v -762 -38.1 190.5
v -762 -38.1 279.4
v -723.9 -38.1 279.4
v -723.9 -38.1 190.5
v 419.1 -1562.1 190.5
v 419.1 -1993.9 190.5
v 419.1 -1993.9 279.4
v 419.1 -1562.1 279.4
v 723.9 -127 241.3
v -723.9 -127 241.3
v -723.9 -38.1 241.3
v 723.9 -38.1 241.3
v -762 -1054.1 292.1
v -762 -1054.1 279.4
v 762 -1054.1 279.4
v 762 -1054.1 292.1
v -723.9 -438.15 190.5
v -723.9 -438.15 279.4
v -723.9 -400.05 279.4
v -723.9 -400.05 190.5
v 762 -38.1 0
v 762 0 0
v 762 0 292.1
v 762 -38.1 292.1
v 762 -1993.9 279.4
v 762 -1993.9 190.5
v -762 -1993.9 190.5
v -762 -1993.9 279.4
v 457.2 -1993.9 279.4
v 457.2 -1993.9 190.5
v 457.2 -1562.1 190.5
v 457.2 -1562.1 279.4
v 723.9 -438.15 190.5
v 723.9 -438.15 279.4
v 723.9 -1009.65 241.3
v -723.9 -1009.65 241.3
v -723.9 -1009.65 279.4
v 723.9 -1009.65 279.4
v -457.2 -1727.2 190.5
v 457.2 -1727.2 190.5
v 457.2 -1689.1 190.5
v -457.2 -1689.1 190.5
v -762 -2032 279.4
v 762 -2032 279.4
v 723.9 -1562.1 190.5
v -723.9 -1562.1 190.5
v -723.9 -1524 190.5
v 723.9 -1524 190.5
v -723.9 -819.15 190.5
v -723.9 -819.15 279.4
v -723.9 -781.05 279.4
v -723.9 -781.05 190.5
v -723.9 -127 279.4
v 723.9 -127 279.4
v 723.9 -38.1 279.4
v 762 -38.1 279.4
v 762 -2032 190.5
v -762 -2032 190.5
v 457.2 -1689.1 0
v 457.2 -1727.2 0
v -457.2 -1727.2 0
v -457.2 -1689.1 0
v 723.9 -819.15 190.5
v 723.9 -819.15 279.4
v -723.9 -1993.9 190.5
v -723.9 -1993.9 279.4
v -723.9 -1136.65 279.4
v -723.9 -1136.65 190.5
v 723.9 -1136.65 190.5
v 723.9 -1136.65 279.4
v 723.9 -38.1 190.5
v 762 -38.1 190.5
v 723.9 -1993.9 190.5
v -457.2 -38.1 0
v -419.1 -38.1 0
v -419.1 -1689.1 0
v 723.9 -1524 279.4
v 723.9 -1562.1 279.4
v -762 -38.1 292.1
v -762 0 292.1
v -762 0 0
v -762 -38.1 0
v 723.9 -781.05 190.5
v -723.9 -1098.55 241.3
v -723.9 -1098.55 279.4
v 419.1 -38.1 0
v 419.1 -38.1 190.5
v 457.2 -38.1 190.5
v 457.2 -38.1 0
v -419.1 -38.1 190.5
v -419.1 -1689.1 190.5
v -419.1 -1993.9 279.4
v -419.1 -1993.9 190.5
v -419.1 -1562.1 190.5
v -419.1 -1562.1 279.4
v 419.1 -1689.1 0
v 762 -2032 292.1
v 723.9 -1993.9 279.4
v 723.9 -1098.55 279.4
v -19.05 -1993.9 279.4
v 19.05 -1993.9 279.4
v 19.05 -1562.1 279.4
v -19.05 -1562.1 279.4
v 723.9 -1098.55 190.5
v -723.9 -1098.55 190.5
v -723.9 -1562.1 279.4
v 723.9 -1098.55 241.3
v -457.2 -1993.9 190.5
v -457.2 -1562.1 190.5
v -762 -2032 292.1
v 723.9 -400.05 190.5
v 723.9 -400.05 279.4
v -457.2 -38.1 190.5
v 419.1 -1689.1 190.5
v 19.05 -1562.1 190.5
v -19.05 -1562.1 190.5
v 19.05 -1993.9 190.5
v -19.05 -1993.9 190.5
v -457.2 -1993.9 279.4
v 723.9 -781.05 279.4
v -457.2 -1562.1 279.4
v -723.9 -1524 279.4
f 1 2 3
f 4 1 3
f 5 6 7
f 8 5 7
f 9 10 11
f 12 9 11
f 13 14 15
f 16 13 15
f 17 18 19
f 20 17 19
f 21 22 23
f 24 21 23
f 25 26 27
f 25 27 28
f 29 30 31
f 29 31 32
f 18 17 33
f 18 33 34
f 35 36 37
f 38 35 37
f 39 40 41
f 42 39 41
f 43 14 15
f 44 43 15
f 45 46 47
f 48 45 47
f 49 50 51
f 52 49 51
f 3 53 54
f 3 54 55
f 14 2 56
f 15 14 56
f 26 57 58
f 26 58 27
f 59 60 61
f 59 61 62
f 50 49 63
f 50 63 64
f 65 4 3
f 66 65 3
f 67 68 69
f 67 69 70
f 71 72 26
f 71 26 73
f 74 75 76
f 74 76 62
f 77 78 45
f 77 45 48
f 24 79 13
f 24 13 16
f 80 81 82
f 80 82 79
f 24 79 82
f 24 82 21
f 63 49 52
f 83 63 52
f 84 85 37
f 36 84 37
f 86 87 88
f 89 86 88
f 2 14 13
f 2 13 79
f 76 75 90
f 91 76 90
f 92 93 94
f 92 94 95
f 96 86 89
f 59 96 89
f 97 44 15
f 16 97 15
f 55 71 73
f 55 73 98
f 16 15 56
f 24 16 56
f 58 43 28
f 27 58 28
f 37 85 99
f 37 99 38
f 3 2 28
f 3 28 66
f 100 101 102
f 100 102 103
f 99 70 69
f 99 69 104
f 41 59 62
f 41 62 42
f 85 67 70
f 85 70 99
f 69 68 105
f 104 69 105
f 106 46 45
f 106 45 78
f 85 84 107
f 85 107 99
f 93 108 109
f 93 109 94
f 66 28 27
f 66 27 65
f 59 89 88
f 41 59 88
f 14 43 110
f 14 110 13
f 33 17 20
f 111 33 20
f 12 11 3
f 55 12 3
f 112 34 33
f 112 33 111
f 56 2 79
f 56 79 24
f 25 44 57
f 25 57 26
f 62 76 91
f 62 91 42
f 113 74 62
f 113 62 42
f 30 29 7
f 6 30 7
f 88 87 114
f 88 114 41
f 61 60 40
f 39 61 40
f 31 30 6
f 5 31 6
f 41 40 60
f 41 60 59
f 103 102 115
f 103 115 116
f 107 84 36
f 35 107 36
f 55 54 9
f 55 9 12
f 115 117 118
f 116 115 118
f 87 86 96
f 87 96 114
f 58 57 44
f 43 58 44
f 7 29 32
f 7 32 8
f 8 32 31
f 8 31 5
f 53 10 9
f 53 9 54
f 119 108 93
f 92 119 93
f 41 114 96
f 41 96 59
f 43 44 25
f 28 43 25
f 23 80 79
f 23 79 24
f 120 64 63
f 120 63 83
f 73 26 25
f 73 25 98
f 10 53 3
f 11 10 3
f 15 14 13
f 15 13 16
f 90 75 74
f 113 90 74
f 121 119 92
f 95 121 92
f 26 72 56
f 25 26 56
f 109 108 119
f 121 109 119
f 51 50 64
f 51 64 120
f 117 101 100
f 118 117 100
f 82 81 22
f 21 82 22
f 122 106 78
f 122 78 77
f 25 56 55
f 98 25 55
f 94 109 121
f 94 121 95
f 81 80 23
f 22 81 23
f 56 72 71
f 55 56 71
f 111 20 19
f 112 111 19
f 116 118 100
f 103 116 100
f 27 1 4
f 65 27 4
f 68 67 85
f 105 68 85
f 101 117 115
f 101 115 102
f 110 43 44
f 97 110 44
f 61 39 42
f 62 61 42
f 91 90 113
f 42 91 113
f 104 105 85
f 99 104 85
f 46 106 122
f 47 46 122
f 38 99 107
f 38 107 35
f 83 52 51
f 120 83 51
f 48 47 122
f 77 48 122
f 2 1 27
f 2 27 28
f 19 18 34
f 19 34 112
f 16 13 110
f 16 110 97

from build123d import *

# Parameters (mm, degrees)
F0_W      = 1524
F0_H      = 292.1
F1_DEPTH  = 38.1
F2_W      = 38.1
F2_H      = 190.5
F3_DEPTH  = 1651
F5_W      = 38.1
F5_H      = 190.5
F6_DEPTH  = 914.4
F7_W      = 38.1
F7_H      = 88.9
F8_DEPTH  = 1955.8
F10_W     = 38.1
F10_H     = 88.9
F11_DEPTH = 1524
F12_W     = 38.1
F12_H     = 88.9
F13_DEPTH = 431.8
F15_W     = 38.1
F15_H     = 88.9
F16_DEPTH = 431.8
F17_W     = 38.1
F17_H     = 88.9
F18_DEPTH = 1447.8
F19_W     = 88.9
F19_H     = 38.1
F20_DEPTH = 1447.8
F21_W     = 38.1
F21_H     = 88.9
F22_DEPTH = 1447.8
F23_W     = 88.9
F23_H     = 38.1
F24_DEPTH = 1447.8
F25_W     = 38.1
F25_H     = 88.9
F26_DEPTH = 1447.8
F27_W     = 38.1
F27_H     = 88.9
F28_DEPTH = 1447.8
F29_W     = 1524
F29_H     = 977.9
F30_DEPTH = 12.7
F31_W     = 1524
F31_H     = 1016
F32_DEPTH = 12.7


with BuildPart() as f1:
    # F0 (on Front) → F1 (new body)
    with BuildSketch(Plane.XZ):
        with Locations((0, 146.05)):
            Rectangle(F0_W, F0_H)
    extrude(amount=F1_DEPTH)


with BuildPart() as f3:
    # F2 (on face) → F3 (new body)
    with BuildSketch(Plane.XZ.offset(38.1)):
        with Locations((438.15, 95.25)):
            Rectangle(F2_W, F2_H)
    extrude(amount=F3_DEPTH)


with BuildPart() as f4_1:
    # F4: instance of F3
    add(f3.part.mirror(Plane.YZ))


with BuildPart() as f6:
    # F5 (on face) → F6 (new body)
    with BuildSketch(Plane.YZ.offset(457.2)):
        with Locations((-1708.15, 95.25)):
            Rectangle(F5_W, F5_H)
    extrude(amount=-F6_DEPTH)


with BuildPart() as f8:
    # F7 (on face) → F8 (new body)
    with BuildSketch(Plane.XZ.offset(38.1)):
        with Locations((-742.95, 234.95)):
            Rectangle(F7_W, F7_H)
    extrude(amount=F8_DEPTH)


with BuildPart() as f9_1:
    # F9: instance of F8
    add(f8.part.mirror(Plane.YZ))


with BuildPart() as f11:
    # F10 (on face) → F11 (new body)
    with BuildSketch(Plane.YZ.offset(762)):
        with Locations((-2012.95, 234.95)):
            Rectangle(F10_W, F10_H)
    extrude(amount=-F11_DEPTH)


with BuildPart() as f13:
    # F12 (on face) → F13 (new body)
    with BuildSketch(Plane(origin=(0, -1993.9, 0), x_dir=(-1, 0, 0), z_dir=(0, 1, 0))):
        with Locations((-438.15, 234.95)):
            Rectangle(F12_W, F12_H)
    extrude(amount=F13_DEPTH)


with BuildPart() as f14_1:
    # F14: instance of F13
    add(f13.part.mirror(Plane.YZ))


with BuildPart() as f16:
    # F15 (on face) → F16 (new body)
    with BuildSketch(Plane(origin=(0, -1993.9, 0), x_dir=(-1, 0, 0), z_dir=(0, 1, 0))):
        with Locations((0, 234.95)):
            Rectangle(F15_W, F15_H)
    extrude(amount=F16_DEPTH)


with BuildPart() as f18:
    # F17 (on face) → F18 (new body)
    with BuildSketch(Plane.YZ.offset(-723.9)):
        with Locations((-1543.05, 234.95)):
            Rectangle(F17_W, F17_H)
    extrude(amount=F18_DEPTH)


with BuildPart() as f20:
    # F19 (on face) → F20 (new body)
    with BuildSketch(Plane.YZ.offset(-723.9)):
        with Locations((-1054.1, 260.35)):
            Rectangle(F19_W, F19_H)
    extrude(amount=F20_DEPTH)


with BuildPart() as f22:
    # F21 (on face) → F22 (new body)
    with BuildSketch(Plane.YZ.offset(-723.9)):
        with Locations((-1117.6, 234.95)):
            Rectangle(F21_W, F21_H)
    extrude(amount=F22_DEPTH)


with BuildPart() as f24:
    # F23 (on face) → F24 (new body)
    with BuildSketch(Plane.YZ.offset(-723.9)):
        with Locations((-82.55, 260.35)):
            Rectangle(F23_W, F23_H)
    extrude(amount=F24_DEPTH)


with BuildPart() as f26:
    # F25 (on face) → F26 (new body)
    with BuildSketch(Plane.YZ.offset(-723.9)):
        with Locations((-800.1, 234.95)):
            Rectangle(F25_W, F25_H)
    extrude(amount=F26_DEPTH)


with BuildPart() as f28:
    # F27 (on face) → F28 (new body)
    with BuildSketch(Plane.YZ.offset(-723.9)):
        with Locations((-419.1, 234.95)):
            Rectangle(F27_W, F27_H)
    extrude(amount=F28_DEPTH)


with BuildPart() as f30:
    # F29 (on face) → F30 (new body)
    with BuildSketch(Plane.XY.offset(279.4)):
        with Locations((0, -1543.05)):
            Rectangle(F29_W, F29_H)
    extrude(amount=F30_DEPTH)


with BuildPart() as f32:
    # F31 (on face) → F32 (new body)
    with BuildSketch(Plane.XY.offset(279.4)):
        with Locations((0, -546.1)):
            Rectangle(F31_W, F31_H)
    extrude(amount=F32_DEPTH)


solid = Compound([f1.part, f3.part, f4_1.part, f6.part, f8.part, f9_1.part, f11.part, f13.part, f14_1.part, f16.part, f18.part, f20.part, f22.part, f24.part, f26.part, f28.part, f30.part, f32.part])
